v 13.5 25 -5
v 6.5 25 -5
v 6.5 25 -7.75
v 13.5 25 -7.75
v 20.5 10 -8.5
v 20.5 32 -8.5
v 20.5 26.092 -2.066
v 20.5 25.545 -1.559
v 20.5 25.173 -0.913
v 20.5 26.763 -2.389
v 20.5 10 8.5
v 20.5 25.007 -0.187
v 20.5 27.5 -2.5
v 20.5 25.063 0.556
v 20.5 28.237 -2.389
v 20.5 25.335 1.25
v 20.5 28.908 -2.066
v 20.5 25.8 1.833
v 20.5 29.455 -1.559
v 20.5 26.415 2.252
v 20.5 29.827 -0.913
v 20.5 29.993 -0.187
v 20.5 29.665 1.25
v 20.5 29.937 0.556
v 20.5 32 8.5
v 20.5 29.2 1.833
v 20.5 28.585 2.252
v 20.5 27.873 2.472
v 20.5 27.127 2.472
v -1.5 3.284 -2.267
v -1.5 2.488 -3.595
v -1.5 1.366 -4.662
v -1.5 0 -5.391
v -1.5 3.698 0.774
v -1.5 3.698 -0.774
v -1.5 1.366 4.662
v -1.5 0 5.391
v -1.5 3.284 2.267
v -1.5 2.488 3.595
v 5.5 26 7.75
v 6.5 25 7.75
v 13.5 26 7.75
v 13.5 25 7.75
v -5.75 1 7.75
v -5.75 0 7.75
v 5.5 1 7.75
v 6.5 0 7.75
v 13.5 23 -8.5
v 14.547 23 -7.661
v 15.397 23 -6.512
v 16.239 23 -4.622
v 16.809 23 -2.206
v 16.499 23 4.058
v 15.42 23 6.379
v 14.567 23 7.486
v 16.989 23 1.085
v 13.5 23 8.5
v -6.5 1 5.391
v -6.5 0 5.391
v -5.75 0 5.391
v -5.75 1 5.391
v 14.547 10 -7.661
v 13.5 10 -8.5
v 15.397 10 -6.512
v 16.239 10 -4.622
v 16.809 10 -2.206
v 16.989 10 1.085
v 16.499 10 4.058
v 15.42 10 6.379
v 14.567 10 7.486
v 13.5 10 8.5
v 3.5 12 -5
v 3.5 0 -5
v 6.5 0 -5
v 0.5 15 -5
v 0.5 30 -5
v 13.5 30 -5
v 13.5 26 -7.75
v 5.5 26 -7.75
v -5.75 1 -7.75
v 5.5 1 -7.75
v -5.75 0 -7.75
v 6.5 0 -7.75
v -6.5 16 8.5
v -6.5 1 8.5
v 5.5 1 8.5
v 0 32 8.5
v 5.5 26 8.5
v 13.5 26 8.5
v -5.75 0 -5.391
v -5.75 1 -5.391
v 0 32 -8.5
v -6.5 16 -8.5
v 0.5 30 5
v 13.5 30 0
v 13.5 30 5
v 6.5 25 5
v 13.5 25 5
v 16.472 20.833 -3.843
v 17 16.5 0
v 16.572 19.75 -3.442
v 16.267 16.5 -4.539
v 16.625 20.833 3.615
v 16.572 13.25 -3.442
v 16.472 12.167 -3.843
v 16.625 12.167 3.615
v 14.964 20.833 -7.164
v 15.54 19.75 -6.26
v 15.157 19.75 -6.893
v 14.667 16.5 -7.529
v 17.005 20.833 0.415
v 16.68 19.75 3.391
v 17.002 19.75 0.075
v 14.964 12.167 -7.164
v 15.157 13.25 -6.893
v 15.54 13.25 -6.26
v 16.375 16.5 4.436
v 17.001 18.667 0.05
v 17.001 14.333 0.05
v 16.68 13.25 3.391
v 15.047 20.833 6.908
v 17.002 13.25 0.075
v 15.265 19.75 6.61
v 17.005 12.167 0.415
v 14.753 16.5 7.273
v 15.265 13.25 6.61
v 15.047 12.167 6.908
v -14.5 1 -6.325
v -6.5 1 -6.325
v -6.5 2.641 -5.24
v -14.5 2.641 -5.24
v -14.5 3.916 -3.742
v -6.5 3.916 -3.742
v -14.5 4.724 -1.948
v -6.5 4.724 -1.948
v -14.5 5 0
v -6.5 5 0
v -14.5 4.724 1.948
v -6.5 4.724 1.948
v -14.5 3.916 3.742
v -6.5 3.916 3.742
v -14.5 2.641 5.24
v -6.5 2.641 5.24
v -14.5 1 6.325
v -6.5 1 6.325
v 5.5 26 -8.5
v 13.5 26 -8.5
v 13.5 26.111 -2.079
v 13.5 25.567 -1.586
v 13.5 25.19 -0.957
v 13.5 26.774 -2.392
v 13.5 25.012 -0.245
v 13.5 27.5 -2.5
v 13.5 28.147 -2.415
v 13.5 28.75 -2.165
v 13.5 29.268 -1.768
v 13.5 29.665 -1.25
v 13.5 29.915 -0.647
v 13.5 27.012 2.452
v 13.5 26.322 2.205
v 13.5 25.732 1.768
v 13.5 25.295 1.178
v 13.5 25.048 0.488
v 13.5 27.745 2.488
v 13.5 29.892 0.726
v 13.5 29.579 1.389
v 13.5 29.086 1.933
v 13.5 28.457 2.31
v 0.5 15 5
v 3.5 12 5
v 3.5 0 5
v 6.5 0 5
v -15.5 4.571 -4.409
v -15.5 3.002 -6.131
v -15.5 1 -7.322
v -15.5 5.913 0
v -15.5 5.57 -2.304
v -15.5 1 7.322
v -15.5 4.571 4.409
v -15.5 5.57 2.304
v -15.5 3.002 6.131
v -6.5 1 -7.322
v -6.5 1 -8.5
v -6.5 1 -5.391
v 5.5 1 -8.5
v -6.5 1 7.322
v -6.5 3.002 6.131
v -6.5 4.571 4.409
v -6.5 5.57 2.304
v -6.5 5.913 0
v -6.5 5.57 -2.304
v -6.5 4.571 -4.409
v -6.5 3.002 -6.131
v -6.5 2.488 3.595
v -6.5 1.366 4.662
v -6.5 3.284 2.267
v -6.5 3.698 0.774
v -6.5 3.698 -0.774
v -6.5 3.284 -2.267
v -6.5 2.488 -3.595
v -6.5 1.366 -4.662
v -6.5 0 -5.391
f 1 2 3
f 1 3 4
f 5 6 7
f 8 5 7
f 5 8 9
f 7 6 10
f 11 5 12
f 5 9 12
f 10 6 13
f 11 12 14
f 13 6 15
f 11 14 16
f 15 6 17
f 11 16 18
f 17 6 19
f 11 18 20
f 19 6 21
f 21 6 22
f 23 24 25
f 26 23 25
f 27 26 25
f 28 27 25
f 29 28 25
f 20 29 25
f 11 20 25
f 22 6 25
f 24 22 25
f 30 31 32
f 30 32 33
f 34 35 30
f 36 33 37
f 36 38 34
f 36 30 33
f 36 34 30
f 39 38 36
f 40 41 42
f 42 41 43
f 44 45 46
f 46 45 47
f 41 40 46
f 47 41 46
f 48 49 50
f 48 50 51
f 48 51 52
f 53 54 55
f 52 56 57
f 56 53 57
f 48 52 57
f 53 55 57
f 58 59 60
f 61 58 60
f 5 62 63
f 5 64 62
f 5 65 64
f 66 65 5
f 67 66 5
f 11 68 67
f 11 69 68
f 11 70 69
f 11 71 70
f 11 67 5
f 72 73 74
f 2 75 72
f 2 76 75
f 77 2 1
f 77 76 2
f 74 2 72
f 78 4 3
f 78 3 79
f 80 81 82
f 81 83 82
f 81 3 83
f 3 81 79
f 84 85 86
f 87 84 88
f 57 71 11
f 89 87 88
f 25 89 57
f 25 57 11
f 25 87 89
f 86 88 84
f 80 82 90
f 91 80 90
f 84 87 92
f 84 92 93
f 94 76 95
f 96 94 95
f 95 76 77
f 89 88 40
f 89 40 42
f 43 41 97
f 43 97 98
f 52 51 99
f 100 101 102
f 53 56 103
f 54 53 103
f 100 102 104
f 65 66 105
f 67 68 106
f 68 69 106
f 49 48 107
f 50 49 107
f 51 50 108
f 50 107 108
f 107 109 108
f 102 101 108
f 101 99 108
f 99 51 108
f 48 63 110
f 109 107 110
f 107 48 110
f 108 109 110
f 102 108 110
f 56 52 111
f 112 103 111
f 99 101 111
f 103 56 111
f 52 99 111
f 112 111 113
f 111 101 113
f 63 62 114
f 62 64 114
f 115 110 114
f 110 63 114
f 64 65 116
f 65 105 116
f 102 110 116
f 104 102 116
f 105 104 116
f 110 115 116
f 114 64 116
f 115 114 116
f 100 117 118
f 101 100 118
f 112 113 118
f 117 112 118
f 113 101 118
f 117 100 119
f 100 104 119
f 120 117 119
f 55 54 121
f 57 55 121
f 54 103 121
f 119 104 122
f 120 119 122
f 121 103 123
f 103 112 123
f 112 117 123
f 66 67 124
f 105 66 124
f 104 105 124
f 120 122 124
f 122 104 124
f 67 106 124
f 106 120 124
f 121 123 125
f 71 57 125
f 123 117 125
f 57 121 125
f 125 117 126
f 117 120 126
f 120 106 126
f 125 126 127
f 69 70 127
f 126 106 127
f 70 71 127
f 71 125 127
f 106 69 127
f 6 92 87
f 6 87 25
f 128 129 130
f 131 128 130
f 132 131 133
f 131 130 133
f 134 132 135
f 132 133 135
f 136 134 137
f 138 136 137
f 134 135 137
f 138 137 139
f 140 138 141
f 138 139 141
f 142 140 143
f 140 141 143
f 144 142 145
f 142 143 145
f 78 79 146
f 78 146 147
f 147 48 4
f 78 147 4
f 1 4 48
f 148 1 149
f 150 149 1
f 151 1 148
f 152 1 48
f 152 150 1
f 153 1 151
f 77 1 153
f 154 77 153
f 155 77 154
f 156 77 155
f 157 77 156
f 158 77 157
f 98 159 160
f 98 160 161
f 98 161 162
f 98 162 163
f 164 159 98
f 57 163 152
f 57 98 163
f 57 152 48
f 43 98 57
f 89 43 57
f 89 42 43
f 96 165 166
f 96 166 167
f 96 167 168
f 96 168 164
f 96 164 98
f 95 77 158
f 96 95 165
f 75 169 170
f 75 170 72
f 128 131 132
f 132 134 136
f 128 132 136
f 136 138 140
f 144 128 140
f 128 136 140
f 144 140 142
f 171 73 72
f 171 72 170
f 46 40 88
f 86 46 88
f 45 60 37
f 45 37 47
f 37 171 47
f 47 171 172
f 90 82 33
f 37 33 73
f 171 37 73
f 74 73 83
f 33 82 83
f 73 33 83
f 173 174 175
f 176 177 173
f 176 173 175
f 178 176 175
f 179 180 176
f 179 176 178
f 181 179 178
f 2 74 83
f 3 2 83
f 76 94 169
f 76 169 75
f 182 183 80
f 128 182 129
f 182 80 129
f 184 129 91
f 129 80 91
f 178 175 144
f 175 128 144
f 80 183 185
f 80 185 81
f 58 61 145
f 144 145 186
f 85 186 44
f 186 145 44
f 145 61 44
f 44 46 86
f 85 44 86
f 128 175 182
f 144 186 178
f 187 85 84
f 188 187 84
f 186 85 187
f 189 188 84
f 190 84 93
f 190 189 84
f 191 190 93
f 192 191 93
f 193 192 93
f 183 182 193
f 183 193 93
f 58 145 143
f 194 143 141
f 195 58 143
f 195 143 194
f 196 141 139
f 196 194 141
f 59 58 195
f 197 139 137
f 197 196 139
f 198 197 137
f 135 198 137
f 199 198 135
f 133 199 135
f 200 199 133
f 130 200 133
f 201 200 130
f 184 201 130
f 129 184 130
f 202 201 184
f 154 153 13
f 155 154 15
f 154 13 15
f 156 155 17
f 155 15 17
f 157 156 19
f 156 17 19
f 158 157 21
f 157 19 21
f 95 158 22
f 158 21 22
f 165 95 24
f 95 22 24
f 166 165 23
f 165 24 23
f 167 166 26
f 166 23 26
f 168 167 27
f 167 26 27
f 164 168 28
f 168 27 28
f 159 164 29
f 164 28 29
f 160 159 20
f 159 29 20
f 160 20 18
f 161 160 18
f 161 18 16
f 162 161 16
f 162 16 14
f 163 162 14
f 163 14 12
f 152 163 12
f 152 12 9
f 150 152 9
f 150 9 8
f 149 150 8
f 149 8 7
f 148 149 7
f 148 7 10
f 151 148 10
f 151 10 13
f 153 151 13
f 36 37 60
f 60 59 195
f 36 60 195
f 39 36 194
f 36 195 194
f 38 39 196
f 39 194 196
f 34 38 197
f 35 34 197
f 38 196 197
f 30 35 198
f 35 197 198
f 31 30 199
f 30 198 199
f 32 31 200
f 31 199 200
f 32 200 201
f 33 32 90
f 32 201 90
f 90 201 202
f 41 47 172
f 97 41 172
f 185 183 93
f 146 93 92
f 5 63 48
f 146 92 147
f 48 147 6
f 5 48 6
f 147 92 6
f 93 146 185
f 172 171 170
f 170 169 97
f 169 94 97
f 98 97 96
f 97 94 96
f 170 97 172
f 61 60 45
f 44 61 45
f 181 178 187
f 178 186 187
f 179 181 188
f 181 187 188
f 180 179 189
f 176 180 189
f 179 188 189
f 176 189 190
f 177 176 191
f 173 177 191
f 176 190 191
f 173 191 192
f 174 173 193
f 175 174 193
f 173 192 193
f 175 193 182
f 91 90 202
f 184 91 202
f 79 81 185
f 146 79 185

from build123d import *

# Parameters (mm, degrees)
SKETCH1_W           = 13
SKETCH1_H           = 17
BOSS_EXTRUDE1_DEPTH = 30
SKETCH2_R           = 5.75
CUT_EXTRUDE1_DEPTH  = 5
SKETCH3_W           = 3
SKETCH3_H           = 10
CUT_EXTRUDE2_DEPTH  = 32.851216617
SKETCH4_W           = 27
SKETCH4_H           = 17
BOSS_EXTRUDE2_DEPTH = 2
SKETCH5_W           = 7
SKETCH5_H           = 17
BOSS_EXTRUDE3_DEPTH = 20
SKETCH6_W           = 7
SKETCH6_H           = 3.5
BOSS_EXTRUDE4_DEPTH = 5
SKETCH7_R           = 2.5
CUT_EXTRUDE3_DEPTH  = 7
CUT_EXTRUDE4_DEPTH  = 42.632319176
CUT_EXTRUDE5_DEPTH  = 1
SKETCH11_W          = 0.75
SKETCH11_H          = 24
CUT_EXTRUDE6_DEPTH  = 1
SKETCH12_W          = 8
SKETCH12_H          = 0.75
CUT_EXTRUDE7_DEPTH  = 1
CUT_EXTRUDE8_DEPTH  = 13
SKETCH14_W          = 10
SKETCH14_H          = 15
CUT_EXTRUDE9_DEPTH  = 3
CHAMFER1_SIZE       = 3
BOSS_EXTRUDE5_DEPTH = 8
BOSS_EXTRUDE6_DEPTH = 1


with BuildPart() as part:
    # Sketch1 → Boss-Extrude1 (new body)
    with BuildSketch(Plane(origin=(0, 0, 0), x_dir=(1, 0, 0), z_dir=(0, 1, 0))):
        Rectangle(SKETCH1_W, SKETCH1_H)
    extrude(amount=BOSS_EXTRUDE1_DEPTH)

    # Sketch2 → Cut-Extrude1 (cut)
    with BuildSketch(Plane.ZY.offset(6.5)):
        with Locations((0, -2)):
            Circle(SKETCH2_R)
    extrude(amount=-CUT_EXTRUDE1_DEPTH, mode=Mode.SUBTRACT)

    # Sketch3 → Cut-Extrude2 (cut, through all)
    with BuildSketch(Plane.XZ):
        with Locations((5, 0)):
            Rectangle(SKETCH3_W, SKETCH3_H)
    extrude(amount=-CUT_EXTRUDE2_DEPTH, mode=Mode.SUBTRACT)

    # Sketch4 → Boss-Extrude2 (add)
    with BuildSketch(Plane(origin=(0, 30, 0), x_dir=(1, 0, 0), z_dir=(0, 1, 0))):
        with Locations((7, 0)):
            Rectangle(SKETCH4_W, SKETCH4_H)
    extrude(amount=BOSS_EXTRUDE2_DEPTH)

    # Sketch5 → Boss-Extrude3 (add)
    with BuildSketch(Plane.XZ.offset(-30)):
        with Locations((17, 0)):
            Rectangle(SKETCH5_W, SKETCH5_H)
    extrude(amount=BOSS_EXTRUDE3_DEPTH)

    # Sketch6 → Boss-Extrude4 (add)
    with BuildSketch(Plane.XZ.offset(-30)):
        with Locations((10, 6.75)):
            Rectangle(SKETCH6_W, SKETCH6_H)
        with Locations((10, -6.75)):
            Rectangle(SKETCH6_W, SKETCH6_H)
    extrude(amount=BOSS_EXTRUDE4_DEPTH)

    # Sketch7 → Cut-Extrude3 (cut)
    with BuildSketch(Plane(origin=(20.5, 0, 0), x_dir=(0, 0, -1), z_dir=(1, 0, 0))):
        with Locations((0, 27.5)):
            Circle(SKETCH7_R)
    extrude(amount=-CUT_EXTRUDE3_DEPTH, mode=Mode.SUBTRACT)

    # Sketch9 → Cut-Extrude4 (cut, through all)
    with BuildSketch(Plane.XY.offset(8.5)):
        Polygon((0, 32), (-6.5, 16), (-6.5, 32), align=None)
    extrude(amount=-CUT_EXTRUDE4_DEPTH, mode=Mode.SUBTRACT)

    # Sketch10 → Cut-Extrude5 (cut)
    with BuildSketch(Plane.XZ):
        Polygon((-5.75, 5.390964663), (-5.75, 7.75), (6.5, 7.75), (6.5, 8.5), (-6.5, 8.5), (-6.5, 5.390964663), align=None)
        Polygon((-5.75, -7.75), (-5.75, -5.390964663), (-6.5, -5.390964663), (-6.5, -8.5), (6.5, -8.5), (6.5, -7.75), align=None)
    extrude(amount=-CUT_EXTRUDE5_DEPTH, mode=Mode.SUBTRACT)

    # Sketch11 → Cut-Extrude6 (cut)
    with BuildSketch(Plane(origin=(6.5, 0, 0), x_dir=(0, 0, -1), z_dir=(1, 0, 0))):
        with Locations((-8.125, 13)):
            Rectangle(SKETCH11_W, SKETCH11_H)
        with Locations((8.125, 13)):
            Rectangle(SKETCH11_W, SKETCH11_H)
    extrude(amount=-CUT_EXTRUDE6_DEPTH, mode=Mode.SUBTRACT)

    # Sketch12 → Cut-Extrude7 (cut)
    with BuildSketch(Plane.XZ.offset(-25)):
        with Locations((9.5, -8.125)):
            Rectangle(SKETCH12_W, SKETCH12_H)
        with Locations((9.5, 8.125)):
            Rectangle(SKETCH12_W, SKETCH12_H)
    extrude(amount=-CUT_EXTRUDE7_DEPTH, mode=Mode.SUBTRACT)

    # Sketch13 → Cut-Extrude8 (cut)
    with BuildSketch(Plane.XZ.offset(-10)):
        with BuildLine():
            Line((13.5, -8.5), (13.5, 8.5))
            add(Edge.make_bspline(
                [(13.5, -8.5), (15.857076701, -7.146482538), (17.987215619, 0.415145569), (16.168492061, 6.316191401), (13.5, 8.5)],
                knots=[0, 0, 0, 0, 0.5, 1, 1, 1, 1], degree=3))
        make_face()
    extrude(amount=-CUT_EXTRUDE8_DEPTH, mode=Mode.SUBTRACT)

    # Sketch14 → Cut-Extrude9 (cut)
    with BuildSketch(Plane(origin=(3.5, 0, 0), x_dir=(0, 0, -1), z_dir=(1, 0, 0))):
        with Locations((0, 22.5)):
            Rectangle(SKETCH14_W, SKETCH14_H)
    extrude(amount=-CUT_EXTRUDE9_DEPTH, mode=Mode.SUBTRACT)

    # Chamfer1
    chamfer1_edges = [part.edges().sort_by_distance(p)[0] for p in [
        (3.5, 15, 0),
    ]]
    chamfer(chamfer1_edges, length=CHAMFER1_SIZE - 0.0001)  # a hair under: the kernel refuses the full size

    # Sketch15 → Boss-Extrude5 (add)
    with BuildSketch(Plane.ZY.offset(6.5)):
        with BuildLine():
            Line((-7.322463691, 1), (-6.32455532, 1))
            ThreePointArc((-6.32455532, 1), (0, 5), (6.32455532, 1))
            Line((6.32455532, 1), (7.322463691, 1))
            ThreePointArc((7.322463691, 1), (0, 5.913183588), (-7.322463691, 1))
        make_face()
    extrude(amount=BOSS_EXTRUDE5_DEPTH)

    # Sketch16 → Boss-Extrude6 (add)
    with BuildSketch(Plane.ZY.offset(14.5)):
        with BuildLine():
            Line((-7.322463691, 1), (7.322463691, 1))
            ThreePointArc((7.322463691, 1), (0, 5.913183588), (-7.322463691, 1))
        make_face()
    extrude(amount=BOSS_EXTRUDE6_DEPTH)


solid = part.part
